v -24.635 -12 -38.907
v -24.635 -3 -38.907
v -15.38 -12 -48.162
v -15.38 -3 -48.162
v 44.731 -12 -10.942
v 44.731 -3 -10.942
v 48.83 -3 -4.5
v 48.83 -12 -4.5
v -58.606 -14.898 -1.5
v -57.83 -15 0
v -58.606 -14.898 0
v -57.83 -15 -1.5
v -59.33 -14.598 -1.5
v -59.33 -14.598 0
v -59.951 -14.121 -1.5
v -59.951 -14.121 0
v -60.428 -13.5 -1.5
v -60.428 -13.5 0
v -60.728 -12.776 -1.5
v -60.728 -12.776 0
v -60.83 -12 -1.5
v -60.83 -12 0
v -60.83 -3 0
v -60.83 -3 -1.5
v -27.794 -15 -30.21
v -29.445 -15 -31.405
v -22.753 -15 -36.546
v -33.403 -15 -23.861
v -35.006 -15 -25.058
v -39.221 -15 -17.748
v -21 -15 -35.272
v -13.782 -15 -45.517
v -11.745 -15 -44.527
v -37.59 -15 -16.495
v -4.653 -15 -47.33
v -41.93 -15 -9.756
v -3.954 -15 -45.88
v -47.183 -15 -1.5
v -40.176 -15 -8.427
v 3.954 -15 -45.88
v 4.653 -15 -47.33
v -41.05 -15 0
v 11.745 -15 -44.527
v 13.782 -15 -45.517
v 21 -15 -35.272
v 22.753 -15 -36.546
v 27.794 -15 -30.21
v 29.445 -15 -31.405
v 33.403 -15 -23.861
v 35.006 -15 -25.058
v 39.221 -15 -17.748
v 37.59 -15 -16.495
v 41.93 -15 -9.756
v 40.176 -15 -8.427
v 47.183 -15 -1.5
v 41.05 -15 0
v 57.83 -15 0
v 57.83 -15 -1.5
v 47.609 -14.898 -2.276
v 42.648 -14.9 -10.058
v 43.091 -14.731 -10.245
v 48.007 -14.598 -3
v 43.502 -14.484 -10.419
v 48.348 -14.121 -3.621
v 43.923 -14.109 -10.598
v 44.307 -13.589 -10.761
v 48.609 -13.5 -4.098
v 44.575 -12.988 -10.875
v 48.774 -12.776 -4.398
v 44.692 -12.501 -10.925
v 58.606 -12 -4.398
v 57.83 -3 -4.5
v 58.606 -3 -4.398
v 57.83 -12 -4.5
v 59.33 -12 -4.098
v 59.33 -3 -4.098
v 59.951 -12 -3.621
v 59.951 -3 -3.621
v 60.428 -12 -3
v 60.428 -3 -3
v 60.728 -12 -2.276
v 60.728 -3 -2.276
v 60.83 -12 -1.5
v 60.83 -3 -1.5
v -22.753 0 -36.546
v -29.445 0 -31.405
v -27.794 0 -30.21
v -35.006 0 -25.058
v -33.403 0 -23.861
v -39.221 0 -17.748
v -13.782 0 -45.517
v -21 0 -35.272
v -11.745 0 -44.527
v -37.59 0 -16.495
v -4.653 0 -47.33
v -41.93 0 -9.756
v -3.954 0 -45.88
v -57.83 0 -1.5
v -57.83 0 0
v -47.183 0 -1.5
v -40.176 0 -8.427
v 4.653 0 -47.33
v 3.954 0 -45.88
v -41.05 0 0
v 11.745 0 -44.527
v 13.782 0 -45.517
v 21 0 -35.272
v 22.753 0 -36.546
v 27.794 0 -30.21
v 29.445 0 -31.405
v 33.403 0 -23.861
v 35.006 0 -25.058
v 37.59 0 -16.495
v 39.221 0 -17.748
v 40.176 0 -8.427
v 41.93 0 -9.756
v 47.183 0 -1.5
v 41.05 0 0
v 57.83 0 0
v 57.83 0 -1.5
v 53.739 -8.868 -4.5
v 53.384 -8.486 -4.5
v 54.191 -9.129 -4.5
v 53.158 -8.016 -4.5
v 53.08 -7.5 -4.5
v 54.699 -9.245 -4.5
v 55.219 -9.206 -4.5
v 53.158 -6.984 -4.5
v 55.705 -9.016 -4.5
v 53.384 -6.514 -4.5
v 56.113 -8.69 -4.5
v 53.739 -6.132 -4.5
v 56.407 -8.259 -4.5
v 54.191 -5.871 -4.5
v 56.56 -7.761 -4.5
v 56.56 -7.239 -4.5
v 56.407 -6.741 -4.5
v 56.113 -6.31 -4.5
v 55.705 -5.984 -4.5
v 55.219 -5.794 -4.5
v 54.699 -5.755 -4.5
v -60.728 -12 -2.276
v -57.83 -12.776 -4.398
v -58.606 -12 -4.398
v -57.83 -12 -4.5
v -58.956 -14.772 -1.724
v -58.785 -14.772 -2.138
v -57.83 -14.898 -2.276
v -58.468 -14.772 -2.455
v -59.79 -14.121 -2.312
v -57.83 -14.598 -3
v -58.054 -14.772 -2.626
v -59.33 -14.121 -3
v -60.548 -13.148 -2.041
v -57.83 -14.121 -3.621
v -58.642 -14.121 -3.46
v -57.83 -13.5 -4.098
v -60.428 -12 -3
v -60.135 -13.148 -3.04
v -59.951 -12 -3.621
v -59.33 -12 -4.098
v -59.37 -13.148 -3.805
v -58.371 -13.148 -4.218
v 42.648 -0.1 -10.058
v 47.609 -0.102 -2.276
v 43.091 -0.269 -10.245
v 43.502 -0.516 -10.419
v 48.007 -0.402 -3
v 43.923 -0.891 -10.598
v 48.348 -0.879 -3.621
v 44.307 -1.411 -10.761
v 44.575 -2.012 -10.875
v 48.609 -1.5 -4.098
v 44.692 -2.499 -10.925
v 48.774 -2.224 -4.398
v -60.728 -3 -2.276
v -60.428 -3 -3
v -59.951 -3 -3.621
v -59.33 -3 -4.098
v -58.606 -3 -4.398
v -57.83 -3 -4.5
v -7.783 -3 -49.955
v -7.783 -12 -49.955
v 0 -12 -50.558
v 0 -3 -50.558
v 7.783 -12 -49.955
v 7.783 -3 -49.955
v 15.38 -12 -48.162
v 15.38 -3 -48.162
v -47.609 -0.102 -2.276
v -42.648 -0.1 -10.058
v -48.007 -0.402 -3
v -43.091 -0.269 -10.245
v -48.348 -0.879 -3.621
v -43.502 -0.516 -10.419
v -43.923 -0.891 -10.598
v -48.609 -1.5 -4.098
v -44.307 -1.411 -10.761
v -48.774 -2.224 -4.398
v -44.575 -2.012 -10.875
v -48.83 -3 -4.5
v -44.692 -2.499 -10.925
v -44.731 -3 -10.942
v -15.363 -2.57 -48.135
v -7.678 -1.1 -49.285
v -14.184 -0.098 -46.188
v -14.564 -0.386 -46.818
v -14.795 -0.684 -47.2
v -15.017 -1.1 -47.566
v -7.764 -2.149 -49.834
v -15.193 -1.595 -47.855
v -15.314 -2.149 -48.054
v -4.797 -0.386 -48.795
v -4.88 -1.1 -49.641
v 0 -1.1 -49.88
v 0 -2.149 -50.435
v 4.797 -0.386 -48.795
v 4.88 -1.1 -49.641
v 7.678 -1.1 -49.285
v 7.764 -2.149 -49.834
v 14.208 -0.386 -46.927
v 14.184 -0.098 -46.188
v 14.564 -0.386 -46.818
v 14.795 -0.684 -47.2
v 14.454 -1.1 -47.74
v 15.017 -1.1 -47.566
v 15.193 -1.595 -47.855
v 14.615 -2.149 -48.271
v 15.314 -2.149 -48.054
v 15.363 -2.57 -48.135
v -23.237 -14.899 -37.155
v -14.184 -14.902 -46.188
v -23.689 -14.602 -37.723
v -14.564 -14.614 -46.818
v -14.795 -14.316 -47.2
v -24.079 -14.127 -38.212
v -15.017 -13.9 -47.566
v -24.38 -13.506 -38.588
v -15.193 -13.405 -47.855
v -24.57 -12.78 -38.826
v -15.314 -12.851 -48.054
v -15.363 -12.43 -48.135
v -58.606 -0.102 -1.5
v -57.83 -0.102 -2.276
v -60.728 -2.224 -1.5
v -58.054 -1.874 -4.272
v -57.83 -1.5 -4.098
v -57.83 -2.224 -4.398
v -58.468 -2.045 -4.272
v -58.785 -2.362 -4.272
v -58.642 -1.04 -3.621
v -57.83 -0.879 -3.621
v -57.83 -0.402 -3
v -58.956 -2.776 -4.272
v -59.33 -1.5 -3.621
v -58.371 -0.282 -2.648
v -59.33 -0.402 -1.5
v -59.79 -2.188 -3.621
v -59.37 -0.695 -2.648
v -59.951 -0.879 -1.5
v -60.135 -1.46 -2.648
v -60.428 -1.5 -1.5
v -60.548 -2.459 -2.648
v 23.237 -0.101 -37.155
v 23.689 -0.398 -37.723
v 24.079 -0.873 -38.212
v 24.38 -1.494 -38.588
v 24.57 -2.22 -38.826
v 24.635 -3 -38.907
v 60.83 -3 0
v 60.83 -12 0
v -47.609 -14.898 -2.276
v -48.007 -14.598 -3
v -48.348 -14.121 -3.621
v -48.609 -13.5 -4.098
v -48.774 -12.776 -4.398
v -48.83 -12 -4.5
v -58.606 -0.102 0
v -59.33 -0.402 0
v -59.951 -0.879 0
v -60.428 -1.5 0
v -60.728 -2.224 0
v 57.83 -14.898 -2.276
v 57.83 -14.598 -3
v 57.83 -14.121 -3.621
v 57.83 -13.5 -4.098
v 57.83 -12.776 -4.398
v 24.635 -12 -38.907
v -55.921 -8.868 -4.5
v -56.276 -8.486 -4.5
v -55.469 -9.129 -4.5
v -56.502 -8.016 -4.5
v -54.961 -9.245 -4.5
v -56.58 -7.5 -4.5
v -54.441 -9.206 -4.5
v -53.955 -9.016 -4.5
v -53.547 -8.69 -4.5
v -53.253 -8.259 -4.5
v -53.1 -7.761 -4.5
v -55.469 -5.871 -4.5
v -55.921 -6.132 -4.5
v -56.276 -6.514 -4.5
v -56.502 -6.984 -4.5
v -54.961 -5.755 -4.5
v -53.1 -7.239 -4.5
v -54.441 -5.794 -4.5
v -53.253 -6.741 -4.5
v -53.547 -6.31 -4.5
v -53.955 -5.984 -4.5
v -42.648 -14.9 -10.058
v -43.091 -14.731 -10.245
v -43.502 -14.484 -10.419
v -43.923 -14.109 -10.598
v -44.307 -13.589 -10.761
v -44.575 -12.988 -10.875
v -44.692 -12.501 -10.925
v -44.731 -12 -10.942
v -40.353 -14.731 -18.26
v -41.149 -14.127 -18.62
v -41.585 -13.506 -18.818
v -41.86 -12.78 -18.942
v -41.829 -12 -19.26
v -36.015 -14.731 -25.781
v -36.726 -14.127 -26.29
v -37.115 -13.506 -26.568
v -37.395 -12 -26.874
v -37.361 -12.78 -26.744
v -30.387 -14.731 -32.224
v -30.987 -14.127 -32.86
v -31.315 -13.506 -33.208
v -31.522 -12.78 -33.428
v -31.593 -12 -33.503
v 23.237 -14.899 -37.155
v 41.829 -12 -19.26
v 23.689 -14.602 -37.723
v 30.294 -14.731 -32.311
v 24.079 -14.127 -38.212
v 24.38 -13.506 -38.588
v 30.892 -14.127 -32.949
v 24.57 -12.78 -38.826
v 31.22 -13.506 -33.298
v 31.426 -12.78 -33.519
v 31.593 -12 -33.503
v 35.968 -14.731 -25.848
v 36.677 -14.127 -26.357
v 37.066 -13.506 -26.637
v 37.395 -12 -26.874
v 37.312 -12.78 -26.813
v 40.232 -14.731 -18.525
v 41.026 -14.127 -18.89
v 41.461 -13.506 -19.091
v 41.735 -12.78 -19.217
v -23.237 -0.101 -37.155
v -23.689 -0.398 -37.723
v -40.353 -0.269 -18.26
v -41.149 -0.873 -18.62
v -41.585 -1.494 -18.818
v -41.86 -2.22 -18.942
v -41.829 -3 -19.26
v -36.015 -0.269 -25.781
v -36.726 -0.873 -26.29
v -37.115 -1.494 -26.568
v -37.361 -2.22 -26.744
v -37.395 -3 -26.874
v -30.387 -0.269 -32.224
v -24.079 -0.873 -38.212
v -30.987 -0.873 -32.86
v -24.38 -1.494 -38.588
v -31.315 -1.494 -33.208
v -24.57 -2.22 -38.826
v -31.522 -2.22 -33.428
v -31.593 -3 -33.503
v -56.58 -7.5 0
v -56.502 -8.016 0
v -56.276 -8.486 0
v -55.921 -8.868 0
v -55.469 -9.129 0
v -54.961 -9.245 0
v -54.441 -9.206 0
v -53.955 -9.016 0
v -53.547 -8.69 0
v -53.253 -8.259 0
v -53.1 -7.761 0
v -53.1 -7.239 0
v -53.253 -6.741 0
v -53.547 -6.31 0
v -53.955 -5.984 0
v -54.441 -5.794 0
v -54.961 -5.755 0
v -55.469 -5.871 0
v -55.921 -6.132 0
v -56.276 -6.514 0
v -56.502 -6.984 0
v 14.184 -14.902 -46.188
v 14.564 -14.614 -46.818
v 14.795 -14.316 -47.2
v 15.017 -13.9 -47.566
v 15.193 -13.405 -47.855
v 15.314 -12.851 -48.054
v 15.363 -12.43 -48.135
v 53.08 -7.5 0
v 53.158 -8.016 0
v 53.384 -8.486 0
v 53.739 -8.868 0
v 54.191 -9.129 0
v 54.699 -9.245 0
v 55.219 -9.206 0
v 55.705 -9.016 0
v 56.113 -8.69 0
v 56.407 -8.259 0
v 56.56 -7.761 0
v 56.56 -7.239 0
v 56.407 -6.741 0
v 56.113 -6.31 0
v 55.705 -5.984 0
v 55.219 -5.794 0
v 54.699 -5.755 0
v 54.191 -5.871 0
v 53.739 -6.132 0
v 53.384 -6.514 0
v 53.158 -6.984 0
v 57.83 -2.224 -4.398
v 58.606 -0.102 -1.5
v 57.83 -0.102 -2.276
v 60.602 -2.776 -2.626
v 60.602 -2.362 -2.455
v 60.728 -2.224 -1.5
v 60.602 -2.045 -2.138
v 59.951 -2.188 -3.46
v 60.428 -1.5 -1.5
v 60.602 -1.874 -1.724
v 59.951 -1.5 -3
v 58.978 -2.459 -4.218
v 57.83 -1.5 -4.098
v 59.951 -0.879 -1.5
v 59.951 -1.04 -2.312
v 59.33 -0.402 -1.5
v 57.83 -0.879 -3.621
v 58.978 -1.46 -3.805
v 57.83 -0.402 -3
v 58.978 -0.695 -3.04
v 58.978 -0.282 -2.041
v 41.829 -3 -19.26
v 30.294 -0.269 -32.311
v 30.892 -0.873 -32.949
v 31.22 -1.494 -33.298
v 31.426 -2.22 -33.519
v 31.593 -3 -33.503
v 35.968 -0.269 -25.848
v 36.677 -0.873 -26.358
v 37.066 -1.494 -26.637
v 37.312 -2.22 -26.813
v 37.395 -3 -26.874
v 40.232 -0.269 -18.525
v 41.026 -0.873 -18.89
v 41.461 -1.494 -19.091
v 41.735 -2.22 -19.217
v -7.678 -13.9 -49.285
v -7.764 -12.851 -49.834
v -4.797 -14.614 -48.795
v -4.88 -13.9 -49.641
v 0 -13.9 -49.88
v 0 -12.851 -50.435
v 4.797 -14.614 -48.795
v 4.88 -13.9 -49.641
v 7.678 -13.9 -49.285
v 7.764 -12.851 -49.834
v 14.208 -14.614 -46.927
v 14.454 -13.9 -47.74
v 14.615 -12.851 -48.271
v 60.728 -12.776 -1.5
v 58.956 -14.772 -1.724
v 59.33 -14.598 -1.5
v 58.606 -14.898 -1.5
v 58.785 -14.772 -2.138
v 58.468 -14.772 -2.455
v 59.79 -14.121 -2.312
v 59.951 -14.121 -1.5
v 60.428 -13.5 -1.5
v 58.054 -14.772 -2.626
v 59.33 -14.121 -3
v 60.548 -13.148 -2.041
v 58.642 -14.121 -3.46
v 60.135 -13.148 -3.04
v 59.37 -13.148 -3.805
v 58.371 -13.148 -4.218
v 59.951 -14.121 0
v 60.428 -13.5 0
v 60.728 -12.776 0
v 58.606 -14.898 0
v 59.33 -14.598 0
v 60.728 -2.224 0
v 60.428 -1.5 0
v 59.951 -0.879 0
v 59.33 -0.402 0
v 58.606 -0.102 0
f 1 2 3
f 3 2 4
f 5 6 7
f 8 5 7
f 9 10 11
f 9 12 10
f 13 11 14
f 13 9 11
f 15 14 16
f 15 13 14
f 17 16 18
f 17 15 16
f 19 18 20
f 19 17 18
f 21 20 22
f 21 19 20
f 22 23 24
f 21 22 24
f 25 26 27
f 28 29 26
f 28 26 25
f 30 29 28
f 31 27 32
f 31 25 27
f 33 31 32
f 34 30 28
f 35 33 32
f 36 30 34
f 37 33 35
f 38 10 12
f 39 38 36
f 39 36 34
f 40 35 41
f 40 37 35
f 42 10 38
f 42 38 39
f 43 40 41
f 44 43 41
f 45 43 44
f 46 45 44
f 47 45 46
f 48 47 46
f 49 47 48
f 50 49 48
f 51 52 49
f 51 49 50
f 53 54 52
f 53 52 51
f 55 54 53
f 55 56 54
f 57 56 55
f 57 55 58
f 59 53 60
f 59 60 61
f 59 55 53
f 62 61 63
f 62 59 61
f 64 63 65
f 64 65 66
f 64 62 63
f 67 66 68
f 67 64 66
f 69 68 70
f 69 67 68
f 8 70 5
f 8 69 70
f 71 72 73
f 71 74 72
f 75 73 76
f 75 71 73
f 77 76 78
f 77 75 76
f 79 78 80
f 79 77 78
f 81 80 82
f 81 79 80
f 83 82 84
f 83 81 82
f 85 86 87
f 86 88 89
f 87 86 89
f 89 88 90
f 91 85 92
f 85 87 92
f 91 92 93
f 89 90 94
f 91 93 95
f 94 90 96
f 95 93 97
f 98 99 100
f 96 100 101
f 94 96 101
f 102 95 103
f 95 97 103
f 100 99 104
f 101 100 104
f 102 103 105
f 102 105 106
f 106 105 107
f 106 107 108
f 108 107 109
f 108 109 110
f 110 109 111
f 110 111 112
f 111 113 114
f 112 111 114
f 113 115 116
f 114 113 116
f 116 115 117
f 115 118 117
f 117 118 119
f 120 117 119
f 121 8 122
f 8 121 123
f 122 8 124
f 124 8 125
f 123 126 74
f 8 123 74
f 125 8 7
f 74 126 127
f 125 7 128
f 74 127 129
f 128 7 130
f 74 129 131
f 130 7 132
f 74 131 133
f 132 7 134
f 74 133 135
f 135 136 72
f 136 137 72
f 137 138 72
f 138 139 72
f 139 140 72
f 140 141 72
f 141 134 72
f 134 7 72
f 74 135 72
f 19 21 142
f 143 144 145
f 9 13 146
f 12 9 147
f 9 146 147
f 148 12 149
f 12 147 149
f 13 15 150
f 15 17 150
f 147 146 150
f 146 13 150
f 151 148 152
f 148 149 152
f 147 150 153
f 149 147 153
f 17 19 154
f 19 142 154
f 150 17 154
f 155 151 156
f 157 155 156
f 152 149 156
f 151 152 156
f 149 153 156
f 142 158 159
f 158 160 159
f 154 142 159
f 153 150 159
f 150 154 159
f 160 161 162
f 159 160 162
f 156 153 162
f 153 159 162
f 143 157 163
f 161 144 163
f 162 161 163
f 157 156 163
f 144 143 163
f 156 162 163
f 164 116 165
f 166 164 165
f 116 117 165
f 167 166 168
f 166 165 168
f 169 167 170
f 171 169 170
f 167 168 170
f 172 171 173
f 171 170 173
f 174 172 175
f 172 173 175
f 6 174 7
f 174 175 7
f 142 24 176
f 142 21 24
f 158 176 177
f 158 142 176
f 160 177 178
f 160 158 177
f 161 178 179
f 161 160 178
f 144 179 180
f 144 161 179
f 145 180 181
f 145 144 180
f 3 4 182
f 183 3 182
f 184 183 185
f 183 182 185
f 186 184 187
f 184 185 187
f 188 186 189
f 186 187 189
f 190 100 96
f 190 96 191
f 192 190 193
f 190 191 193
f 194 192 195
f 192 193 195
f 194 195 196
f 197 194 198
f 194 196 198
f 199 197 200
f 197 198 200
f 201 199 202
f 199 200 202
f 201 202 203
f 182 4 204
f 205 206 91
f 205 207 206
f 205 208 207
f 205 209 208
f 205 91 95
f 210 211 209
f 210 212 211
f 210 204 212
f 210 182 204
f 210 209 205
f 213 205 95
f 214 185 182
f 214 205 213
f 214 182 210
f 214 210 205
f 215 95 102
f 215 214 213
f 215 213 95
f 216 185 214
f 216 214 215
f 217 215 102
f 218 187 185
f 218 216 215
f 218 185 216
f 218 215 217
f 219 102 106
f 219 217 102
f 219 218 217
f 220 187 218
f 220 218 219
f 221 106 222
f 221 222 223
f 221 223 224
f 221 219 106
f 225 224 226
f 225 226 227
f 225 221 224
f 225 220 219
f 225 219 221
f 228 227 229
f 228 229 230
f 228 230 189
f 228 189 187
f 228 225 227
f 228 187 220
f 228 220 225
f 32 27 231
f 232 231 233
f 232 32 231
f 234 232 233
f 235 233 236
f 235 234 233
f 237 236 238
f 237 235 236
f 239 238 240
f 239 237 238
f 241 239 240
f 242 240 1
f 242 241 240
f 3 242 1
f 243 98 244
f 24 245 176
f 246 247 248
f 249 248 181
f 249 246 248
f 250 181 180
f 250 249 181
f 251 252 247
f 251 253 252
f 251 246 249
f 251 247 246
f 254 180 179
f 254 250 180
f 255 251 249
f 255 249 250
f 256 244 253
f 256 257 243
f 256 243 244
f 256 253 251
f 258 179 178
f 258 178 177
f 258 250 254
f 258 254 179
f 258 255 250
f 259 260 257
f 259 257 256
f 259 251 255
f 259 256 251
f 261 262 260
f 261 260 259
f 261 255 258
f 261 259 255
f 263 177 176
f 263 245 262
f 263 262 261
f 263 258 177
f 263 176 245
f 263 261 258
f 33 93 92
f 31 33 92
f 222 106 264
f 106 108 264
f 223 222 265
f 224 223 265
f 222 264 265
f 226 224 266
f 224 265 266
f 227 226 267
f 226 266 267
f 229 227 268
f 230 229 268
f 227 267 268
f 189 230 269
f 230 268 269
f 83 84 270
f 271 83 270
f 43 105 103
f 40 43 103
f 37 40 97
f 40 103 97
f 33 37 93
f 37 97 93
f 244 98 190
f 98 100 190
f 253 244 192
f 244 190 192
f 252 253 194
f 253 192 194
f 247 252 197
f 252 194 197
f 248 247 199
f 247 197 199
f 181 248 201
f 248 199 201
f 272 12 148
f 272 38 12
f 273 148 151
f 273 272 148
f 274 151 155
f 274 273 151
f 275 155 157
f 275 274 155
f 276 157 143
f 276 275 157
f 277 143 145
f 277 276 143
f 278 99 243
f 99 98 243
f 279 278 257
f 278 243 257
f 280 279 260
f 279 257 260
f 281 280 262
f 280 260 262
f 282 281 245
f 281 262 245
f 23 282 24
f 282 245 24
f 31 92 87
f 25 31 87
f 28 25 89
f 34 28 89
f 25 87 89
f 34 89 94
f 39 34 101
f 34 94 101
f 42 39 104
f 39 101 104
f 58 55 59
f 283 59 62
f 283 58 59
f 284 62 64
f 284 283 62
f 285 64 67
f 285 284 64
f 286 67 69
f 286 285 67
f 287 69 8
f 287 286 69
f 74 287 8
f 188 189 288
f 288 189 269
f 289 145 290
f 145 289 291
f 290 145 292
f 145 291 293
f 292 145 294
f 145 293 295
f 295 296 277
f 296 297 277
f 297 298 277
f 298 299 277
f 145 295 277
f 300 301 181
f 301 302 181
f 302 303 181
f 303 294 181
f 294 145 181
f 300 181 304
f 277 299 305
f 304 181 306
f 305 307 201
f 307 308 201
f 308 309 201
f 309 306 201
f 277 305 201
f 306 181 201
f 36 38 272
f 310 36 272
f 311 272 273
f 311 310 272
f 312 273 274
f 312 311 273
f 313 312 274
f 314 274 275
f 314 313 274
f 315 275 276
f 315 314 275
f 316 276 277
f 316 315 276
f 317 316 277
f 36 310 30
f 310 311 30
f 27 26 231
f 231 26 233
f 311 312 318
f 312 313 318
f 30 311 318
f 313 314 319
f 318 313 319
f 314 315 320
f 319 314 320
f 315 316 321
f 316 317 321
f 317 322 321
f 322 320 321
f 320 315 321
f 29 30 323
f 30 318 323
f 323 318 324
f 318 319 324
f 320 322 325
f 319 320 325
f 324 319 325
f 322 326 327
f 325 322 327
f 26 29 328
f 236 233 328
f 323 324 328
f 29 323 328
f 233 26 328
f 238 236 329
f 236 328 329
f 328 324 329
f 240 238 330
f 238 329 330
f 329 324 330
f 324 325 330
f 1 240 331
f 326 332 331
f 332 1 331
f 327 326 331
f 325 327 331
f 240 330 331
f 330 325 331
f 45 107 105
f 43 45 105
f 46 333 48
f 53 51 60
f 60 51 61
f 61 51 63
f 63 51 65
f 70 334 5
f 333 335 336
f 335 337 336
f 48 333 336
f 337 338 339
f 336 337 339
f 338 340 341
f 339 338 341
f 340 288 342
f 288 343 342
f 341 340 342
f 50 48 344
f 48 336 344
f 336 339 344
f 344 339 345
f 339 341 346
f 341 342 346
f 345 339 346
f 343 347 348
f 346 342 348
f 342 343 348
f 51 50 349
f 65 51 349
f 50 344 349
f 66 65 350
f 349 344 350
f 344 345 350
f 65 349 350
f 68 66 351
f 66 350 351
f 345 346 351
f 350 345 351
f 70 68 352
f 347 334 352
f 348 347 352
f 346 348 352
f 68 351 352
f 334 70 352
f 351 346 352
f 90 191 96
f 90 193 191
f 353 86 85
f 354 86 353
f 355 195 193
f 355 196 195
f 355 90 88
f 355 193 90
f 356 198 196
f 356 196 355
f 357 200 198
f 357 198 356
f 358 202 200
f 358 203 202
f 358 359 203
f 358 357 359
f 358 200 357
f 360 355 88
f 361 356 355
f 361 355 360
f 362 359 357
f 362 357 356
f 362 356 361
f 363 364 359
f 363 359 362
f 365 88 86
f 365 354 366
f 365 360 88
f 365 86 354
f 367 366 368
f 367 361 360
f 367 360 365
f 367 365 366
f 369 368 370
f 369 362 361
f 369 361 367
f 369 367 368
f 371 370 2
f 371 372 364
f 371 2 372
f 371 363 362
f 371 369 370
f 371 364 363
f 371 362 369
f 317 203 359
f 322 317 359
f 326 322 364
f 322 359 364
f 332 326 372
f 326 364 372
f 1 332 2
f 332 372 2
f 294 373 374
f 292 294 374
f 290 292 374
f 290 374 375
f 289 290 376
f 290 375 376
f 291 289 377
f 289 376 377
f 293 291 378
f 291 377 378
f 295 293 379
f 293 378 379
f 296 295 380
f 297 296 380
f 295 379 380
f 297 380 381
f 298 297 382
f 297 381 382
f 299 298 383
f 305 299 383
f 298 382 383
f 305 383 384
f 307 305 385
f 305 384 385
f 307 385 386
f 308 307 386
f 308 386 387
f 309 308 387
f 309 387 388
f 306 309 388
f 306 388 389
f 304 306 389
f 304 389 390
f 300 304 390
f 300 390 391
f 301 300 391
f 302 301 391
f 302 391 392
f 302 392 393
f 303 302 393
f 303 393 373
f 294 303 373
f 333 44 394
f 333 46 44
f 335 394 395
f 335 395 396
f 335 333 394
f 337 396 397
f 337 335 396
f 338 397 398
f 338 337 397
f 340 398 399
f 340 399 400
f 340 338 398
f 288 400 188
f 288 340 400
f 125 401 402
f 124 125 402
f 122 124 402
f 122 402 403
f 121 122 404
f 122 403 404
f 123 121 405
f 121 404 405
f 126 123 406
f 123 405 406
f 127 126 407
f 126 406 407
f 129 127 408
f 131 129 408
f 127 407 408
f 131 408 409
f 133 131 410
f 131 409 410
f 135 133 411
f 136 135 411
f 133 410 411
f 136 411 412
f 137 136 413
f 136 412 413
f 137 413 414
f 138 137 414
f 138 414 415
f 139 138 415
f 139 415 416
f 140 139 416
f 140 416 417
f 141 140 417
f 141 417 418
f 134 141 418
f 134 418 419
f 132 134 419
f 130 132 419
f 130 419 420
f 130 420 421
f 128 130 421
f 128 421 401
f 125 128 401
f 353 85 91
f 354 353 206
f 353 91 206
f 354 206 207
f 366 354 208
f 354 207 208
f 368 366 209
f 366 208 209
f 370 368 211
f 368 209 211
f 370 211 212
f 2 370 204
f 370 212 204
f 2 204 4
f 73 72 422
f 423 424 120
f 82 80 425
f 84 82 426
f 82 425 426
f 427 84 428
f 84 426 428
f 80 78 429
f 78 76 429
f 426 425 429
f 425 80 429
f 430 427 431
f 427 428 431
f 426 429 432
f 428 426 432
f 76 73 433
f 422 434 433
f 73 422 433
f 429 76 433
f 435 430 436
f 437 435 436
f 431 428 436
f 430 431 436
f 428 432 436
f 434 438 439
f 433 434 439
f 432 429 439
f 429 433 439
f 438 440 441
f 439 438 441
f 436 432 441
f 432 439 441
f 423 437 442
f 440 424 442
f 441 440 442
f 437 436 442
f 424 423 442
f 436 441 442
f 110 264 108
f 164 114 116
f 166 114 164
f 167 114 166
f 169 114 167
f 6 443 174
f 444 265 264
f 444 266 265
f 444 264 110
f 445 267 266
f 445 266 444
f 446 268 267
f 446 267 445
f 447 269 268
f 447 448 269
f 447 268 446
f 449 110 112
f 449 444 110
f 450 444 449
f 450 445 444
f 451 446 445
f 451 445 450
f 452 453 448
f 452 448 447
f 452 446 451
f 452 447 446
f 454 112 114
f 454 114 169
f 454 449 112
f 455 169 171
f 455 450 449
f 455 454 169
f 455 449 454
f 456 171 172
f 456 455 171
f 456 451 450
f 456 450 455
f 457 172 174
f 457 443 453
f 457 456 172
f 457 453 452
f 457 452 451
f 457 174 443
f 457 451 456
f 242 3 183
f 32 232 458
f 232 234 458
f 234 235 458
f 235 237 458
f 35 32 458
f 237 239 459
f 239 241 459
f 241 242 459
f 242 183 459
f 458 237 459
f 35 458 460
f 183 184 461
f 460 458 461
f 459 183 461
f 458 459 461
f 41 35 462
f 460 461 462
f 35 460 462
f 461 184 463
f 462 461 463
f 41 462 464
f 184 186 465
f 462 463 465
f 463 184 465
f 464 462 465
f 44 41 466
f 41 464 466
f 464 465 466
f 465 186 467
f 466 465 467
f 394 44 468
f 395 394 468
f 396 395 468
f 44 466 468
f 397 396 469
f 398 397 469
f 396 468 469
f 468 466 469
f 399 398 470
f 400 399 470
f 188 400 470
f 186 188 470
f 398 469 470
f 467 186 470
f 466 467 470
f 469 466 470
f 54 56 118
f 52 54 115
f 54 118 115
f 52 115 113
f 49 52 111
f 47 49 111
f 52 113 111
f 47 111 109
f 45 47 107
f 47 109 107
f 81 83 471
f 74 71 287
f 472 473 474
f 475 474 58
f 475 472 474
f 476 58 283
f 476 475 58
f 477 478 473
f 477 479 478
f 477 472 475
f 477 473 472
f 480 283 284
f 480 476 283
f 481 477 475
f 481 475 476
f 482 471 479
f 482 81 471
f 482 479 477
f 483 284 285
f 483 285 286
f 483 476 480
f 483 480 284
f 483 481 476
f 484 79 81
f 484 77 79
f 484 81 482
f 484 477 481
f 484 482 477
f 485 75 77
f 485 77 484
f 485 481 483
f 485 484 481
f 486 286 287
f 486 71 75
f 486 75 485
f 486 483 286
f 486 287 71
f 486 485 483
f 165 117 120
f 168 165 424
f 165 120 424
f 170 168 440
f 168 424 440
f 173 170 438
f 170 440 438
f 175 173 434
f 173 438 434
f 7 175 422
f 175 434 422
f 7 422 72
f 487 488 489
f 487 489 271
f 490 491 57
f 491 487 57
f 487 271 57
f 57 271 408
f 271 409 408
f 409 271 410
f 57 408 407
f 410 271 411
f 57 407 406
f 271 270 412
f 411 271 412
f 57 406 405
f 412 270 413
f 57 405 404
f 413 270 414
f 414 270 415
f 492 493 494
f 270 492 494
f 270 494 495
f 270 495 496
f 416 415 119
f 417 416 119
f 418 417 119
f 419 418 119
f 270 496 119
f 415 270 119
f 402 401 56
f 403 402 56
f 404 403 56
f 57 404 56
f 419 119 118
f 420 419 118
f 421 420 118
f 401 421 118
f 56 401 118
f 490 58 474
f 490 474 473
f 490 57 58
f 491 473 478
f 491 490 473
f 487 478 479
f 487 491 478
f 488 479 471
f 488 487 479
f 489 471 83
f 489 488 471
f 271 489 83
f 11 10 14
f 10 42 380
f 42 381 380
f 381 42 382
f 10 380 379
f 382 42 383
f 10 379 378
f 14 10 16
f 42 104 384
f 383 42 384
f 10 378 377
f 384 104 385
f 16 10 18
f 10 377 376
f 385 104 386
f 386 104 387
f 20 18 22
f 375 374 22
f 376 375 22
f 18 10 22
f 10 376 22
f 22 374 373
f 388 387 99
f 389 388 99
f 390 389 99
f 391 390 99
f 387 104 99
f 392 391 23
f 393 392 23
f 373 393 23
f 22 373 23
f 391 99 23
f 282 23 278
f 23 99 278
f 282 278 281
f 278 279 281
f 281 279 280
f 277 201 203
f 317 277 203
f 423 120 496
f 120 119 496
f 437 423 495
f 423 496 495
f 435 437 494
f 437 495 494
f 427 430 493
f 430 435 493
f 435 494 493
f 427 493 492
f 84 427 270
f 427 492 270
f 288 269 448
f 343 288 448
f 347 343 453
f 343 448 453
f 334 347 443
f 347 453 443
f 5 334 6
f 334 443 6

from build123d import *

# Parameters (mm, degrees)
F1_DEPTH = 15
F4_D     = 3.5
F4_DEPTH = 14.5
F5_R     = 3


with BuildPart() as f1:
    # F0 (on Front) → F1 (new body)
    with BuildSketch(Plane.XZ):
        with BuildLine():
            ThreePointArc((-21, -35.271837), (-35.6872, -20.28611), (-41.05, 0))
            Line((-41.05, 0), (-60.83, 0))
            Line((-60.83, 0), (-60.83, -4.5))
            Line((-60.83, -4.5), (-48.83, -4.5))
            Line((-48.83, -4.5), (-44.731143, -10.942))
            ThreePointArc((-44.731143, -10.942), (-37.395384, -26.873551), (-24.634821, -38.906659))
            Line((-24.634821, -38.906659), (-21, -35.271837))
        make_face()
        with BuildLine():
            ThreePointArc((41.05, 0), (35.6872, -20.28611), (21, -35.271837))
            Line((21, -35.271837), (24.634821, -38.906659))
            ThreePointArc((24.634821, -38.906659), (37.395384, -26.873551), (44.731143, -10.942))
            Line((44.731143, -10.942), (48.83, -4.5))
            Line((48.83, -4.5), (60.83, -4.5))
            Line((60.83, -4.5), (60.83, 0))
            Line((60.83, 0), (41.05, 0))
        make_face()
        with BuildLine():
            ThreePointArc((11.744722, -44.527115), (0, -46.05), (-11.744722, -44.527115))
            Line((-11.744722, -44.527115), (-15.379543, -48.161937))
            ThreePointArc((-15.379543, -48.161937), (0, -50.557912), (15.379543, -48.161937))
            Line((15.379543, -48.161937), (11.744722, -44.527115))
        make_face()
        Polygon((-11.744722, -44.527115), (-21, -35.271837), (-24.634821, -38.906659), (-15.379543, -48.161937), align=None)
        Polygon((24.634821, -38.906659), (21, -35.271837), (11.744722, -44.527115), (15.379543, -48.161937), align=None)
    extrude(amount=F1_DEPTH)

    # F4
    with Locations(Plane(origin=(0, 0, -4.5), x_dir=(1, 0, 0), z_dir=(0, 0, -1))):
        with Locations((-54.83, 7.5), (54.83, 7.5)):
            Hole(F4_D / 2, depth=F4_DEPTH)

    # F5
    f5_edges = [f1.edges().sort_by_distance(p)[0] for p in [
        (-60.83, 0, -2.25),
        (-54.83, 0, -4.5),
        (-60.83, -7.5, -4.5),
        (-60.83, -15, -2.25),
        (-54.83, -15, -4.5),
        (-46.780571, -15, -7.721),
        (-46.780571, 0, -7.721),
        (-20.007182, 0, -43.534298),
        (-37.395384, 0, -26.873551),
        (0, 0, -50.557912),
        (20.007182, 0, -43.534298),
        (37.395384, 0, -26.873551),
        (46.780571, 0, -7.721),
        (54.83, 0, -4.5),
        (60.83, -7.5, -4.5),
        (60.83, -15, -2.25),
        (54.83, -15, -4.5),
        (46.780571, -15, -7.721),
        (-20.007182, -15, -43.534298),
        (0, -15, -50.557912),
        (20.007182, -15, -43.534298),
        (37.395384, -15, -26.873551),
        (-37.395384, -15, -26.873551),
        (60.83, 0, -2.25),
    ]]
    fillet(f5_edges, radius=F5_R)


solid = f1.part
